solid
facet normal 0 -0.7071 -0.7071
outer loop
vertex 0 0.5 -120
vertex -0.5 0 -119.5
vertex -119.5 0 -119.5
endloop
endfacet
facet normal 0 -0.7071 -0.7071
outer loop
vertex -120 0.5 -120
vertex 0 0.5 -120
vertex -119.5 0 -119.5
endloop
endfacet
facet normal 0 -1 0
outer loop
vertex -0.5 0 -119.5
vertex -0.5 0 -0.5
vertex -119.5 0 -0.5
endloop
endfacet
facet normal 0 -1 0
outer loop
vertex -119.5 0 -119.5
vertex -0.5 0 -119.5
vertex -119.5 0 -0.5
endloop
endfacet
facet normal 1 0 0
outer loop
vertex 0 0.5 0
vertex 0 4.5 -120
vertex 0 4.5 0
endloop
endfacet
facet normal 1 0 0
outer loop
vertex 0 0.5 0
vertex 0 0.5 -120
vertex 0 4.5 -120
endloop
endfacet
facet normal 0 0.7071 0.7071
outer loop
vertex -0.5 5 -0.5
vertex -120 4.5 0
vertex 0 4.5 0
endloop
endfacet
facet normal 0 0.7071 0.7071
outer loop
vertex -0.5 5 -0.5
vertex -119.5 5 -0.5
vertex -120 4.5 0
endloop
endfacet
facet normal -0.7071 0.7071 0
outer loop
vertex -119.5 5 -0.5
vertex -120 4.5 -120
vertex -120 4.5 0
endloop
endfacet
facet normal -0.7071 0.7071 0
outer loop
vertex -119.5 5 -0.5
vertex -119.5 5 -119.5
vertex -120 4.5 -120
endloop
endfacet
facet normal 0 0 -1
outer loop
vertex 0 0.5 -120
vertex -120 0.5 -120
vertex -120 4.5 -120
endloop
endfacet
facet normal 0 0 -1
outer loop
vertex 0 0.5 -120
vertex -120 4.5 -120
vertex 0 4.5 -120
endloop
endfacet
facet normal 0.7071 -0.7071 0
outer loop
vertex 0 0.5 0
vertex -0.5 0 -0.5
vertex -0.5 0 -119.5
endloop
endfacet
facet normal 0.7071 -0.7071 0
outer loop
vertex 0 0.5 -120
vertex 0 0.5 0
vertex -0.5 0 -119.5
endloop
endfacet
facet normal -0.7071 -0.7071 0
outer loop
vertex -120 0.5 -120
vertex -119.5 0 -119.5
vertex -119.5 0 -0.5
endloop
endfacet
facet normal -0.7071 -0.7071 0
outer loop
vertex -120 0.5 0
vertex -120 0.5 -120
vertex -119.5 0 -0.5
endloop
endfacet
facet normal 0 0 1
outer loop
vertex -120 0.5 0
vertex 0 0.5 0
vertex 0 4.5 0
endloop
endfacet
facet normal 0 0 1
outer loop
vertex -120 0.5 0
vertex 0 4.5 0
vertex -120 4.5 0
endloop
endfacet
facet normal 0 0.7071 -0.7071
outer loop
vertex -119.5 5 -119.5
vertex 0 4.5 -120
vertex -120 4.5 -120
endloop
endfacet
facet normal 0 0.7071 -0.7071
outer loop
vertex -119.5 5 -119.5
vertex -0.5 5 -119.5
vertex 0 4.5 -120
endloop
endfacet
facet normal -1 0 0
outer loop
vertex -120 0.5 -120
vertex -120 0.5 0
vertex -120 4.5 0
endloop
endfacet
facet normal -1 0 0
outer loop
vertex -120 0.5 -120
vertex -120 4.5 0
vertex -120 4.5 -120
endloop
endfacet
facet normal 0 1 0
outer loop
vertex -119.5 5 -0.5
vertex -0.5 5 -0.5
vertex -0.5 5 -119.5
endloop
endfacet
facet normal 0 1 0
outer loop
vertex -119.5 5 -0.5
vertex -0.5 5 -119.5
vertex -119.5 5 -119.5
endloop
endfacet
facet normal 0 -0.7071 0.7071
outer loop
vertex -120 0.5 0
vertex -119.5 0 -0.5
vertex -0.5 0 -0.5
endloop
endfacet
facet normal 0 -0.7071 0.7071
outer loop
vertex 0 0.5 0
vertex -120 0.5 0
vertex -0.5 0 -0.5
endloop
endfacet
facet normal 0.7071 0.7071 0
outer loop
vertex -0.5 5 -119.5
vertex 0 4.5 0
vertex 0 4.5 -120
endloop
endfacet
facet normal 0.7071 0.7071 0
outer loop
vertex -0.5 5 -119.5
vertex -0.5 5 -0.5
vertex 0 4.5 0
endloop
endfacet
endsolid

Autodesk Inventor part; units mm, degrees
ref_plane "YZ Plane" through (0, 0, 0) normal (1, 0, 0) x (0, 1, 0)
ref_plane "XZ Plane" through (0, 0, 0) normal (0, 1, 0) x (-1, 0, 0)
ref_plane "XY Plane" through (0, 0, 0) normal (0, 0, 1) x (1, 0, 0)
sketch "Esboço1" plane through (0, 0, 0) normal (0, 1, 0) x (-1, 0, 0)
  line L0 (0, 0) -> (120, 0)
  line L1 (120, 0) -> (120, -120)
  line L2 (120, -120) -> (0, -120)
  line L3 (0, -120) -> (0, 0)
  dimension "d0" = 120
  dimension "d1" = 120
extrude "Extrusão1" add sketch "Esboço1" along normal blind 5
chamfer "Chamfer1" distance 0.5 angle 45 8 edges at (-60, 5, 0) (0, 5, -60) (-60, 5, -120) (-120, 5, -60) (0, 0, -60) (-60, 0, 0) (-60, 0, -120) (-120, 0, -60)
equation "\"Raio_vergadura\" = Espessura"
equation "\"Largura_alívio_de_vergadura\" = Espessura"
equation "\"Profundidade_alívio_de_vergadura\" = 0.5 * Espessura"
equation "\"Tamanho_alívio_de_dobra\" = 4 * Espessura"
equation "\"Remanescente_mínimo\" = 2 * Espessura"
equation "\"Raiodetransição\" = Raio_vergadura"
equation "\"Tamanho_de_raio_de_Jacobi\" = Raio_vergadura"
equation "\"TamanhoFolga\" = Espessura"
equation "\"Espessura\" = 0.5"
properties part number "Placa da mesa" material "Brass, Soft Yellow"
